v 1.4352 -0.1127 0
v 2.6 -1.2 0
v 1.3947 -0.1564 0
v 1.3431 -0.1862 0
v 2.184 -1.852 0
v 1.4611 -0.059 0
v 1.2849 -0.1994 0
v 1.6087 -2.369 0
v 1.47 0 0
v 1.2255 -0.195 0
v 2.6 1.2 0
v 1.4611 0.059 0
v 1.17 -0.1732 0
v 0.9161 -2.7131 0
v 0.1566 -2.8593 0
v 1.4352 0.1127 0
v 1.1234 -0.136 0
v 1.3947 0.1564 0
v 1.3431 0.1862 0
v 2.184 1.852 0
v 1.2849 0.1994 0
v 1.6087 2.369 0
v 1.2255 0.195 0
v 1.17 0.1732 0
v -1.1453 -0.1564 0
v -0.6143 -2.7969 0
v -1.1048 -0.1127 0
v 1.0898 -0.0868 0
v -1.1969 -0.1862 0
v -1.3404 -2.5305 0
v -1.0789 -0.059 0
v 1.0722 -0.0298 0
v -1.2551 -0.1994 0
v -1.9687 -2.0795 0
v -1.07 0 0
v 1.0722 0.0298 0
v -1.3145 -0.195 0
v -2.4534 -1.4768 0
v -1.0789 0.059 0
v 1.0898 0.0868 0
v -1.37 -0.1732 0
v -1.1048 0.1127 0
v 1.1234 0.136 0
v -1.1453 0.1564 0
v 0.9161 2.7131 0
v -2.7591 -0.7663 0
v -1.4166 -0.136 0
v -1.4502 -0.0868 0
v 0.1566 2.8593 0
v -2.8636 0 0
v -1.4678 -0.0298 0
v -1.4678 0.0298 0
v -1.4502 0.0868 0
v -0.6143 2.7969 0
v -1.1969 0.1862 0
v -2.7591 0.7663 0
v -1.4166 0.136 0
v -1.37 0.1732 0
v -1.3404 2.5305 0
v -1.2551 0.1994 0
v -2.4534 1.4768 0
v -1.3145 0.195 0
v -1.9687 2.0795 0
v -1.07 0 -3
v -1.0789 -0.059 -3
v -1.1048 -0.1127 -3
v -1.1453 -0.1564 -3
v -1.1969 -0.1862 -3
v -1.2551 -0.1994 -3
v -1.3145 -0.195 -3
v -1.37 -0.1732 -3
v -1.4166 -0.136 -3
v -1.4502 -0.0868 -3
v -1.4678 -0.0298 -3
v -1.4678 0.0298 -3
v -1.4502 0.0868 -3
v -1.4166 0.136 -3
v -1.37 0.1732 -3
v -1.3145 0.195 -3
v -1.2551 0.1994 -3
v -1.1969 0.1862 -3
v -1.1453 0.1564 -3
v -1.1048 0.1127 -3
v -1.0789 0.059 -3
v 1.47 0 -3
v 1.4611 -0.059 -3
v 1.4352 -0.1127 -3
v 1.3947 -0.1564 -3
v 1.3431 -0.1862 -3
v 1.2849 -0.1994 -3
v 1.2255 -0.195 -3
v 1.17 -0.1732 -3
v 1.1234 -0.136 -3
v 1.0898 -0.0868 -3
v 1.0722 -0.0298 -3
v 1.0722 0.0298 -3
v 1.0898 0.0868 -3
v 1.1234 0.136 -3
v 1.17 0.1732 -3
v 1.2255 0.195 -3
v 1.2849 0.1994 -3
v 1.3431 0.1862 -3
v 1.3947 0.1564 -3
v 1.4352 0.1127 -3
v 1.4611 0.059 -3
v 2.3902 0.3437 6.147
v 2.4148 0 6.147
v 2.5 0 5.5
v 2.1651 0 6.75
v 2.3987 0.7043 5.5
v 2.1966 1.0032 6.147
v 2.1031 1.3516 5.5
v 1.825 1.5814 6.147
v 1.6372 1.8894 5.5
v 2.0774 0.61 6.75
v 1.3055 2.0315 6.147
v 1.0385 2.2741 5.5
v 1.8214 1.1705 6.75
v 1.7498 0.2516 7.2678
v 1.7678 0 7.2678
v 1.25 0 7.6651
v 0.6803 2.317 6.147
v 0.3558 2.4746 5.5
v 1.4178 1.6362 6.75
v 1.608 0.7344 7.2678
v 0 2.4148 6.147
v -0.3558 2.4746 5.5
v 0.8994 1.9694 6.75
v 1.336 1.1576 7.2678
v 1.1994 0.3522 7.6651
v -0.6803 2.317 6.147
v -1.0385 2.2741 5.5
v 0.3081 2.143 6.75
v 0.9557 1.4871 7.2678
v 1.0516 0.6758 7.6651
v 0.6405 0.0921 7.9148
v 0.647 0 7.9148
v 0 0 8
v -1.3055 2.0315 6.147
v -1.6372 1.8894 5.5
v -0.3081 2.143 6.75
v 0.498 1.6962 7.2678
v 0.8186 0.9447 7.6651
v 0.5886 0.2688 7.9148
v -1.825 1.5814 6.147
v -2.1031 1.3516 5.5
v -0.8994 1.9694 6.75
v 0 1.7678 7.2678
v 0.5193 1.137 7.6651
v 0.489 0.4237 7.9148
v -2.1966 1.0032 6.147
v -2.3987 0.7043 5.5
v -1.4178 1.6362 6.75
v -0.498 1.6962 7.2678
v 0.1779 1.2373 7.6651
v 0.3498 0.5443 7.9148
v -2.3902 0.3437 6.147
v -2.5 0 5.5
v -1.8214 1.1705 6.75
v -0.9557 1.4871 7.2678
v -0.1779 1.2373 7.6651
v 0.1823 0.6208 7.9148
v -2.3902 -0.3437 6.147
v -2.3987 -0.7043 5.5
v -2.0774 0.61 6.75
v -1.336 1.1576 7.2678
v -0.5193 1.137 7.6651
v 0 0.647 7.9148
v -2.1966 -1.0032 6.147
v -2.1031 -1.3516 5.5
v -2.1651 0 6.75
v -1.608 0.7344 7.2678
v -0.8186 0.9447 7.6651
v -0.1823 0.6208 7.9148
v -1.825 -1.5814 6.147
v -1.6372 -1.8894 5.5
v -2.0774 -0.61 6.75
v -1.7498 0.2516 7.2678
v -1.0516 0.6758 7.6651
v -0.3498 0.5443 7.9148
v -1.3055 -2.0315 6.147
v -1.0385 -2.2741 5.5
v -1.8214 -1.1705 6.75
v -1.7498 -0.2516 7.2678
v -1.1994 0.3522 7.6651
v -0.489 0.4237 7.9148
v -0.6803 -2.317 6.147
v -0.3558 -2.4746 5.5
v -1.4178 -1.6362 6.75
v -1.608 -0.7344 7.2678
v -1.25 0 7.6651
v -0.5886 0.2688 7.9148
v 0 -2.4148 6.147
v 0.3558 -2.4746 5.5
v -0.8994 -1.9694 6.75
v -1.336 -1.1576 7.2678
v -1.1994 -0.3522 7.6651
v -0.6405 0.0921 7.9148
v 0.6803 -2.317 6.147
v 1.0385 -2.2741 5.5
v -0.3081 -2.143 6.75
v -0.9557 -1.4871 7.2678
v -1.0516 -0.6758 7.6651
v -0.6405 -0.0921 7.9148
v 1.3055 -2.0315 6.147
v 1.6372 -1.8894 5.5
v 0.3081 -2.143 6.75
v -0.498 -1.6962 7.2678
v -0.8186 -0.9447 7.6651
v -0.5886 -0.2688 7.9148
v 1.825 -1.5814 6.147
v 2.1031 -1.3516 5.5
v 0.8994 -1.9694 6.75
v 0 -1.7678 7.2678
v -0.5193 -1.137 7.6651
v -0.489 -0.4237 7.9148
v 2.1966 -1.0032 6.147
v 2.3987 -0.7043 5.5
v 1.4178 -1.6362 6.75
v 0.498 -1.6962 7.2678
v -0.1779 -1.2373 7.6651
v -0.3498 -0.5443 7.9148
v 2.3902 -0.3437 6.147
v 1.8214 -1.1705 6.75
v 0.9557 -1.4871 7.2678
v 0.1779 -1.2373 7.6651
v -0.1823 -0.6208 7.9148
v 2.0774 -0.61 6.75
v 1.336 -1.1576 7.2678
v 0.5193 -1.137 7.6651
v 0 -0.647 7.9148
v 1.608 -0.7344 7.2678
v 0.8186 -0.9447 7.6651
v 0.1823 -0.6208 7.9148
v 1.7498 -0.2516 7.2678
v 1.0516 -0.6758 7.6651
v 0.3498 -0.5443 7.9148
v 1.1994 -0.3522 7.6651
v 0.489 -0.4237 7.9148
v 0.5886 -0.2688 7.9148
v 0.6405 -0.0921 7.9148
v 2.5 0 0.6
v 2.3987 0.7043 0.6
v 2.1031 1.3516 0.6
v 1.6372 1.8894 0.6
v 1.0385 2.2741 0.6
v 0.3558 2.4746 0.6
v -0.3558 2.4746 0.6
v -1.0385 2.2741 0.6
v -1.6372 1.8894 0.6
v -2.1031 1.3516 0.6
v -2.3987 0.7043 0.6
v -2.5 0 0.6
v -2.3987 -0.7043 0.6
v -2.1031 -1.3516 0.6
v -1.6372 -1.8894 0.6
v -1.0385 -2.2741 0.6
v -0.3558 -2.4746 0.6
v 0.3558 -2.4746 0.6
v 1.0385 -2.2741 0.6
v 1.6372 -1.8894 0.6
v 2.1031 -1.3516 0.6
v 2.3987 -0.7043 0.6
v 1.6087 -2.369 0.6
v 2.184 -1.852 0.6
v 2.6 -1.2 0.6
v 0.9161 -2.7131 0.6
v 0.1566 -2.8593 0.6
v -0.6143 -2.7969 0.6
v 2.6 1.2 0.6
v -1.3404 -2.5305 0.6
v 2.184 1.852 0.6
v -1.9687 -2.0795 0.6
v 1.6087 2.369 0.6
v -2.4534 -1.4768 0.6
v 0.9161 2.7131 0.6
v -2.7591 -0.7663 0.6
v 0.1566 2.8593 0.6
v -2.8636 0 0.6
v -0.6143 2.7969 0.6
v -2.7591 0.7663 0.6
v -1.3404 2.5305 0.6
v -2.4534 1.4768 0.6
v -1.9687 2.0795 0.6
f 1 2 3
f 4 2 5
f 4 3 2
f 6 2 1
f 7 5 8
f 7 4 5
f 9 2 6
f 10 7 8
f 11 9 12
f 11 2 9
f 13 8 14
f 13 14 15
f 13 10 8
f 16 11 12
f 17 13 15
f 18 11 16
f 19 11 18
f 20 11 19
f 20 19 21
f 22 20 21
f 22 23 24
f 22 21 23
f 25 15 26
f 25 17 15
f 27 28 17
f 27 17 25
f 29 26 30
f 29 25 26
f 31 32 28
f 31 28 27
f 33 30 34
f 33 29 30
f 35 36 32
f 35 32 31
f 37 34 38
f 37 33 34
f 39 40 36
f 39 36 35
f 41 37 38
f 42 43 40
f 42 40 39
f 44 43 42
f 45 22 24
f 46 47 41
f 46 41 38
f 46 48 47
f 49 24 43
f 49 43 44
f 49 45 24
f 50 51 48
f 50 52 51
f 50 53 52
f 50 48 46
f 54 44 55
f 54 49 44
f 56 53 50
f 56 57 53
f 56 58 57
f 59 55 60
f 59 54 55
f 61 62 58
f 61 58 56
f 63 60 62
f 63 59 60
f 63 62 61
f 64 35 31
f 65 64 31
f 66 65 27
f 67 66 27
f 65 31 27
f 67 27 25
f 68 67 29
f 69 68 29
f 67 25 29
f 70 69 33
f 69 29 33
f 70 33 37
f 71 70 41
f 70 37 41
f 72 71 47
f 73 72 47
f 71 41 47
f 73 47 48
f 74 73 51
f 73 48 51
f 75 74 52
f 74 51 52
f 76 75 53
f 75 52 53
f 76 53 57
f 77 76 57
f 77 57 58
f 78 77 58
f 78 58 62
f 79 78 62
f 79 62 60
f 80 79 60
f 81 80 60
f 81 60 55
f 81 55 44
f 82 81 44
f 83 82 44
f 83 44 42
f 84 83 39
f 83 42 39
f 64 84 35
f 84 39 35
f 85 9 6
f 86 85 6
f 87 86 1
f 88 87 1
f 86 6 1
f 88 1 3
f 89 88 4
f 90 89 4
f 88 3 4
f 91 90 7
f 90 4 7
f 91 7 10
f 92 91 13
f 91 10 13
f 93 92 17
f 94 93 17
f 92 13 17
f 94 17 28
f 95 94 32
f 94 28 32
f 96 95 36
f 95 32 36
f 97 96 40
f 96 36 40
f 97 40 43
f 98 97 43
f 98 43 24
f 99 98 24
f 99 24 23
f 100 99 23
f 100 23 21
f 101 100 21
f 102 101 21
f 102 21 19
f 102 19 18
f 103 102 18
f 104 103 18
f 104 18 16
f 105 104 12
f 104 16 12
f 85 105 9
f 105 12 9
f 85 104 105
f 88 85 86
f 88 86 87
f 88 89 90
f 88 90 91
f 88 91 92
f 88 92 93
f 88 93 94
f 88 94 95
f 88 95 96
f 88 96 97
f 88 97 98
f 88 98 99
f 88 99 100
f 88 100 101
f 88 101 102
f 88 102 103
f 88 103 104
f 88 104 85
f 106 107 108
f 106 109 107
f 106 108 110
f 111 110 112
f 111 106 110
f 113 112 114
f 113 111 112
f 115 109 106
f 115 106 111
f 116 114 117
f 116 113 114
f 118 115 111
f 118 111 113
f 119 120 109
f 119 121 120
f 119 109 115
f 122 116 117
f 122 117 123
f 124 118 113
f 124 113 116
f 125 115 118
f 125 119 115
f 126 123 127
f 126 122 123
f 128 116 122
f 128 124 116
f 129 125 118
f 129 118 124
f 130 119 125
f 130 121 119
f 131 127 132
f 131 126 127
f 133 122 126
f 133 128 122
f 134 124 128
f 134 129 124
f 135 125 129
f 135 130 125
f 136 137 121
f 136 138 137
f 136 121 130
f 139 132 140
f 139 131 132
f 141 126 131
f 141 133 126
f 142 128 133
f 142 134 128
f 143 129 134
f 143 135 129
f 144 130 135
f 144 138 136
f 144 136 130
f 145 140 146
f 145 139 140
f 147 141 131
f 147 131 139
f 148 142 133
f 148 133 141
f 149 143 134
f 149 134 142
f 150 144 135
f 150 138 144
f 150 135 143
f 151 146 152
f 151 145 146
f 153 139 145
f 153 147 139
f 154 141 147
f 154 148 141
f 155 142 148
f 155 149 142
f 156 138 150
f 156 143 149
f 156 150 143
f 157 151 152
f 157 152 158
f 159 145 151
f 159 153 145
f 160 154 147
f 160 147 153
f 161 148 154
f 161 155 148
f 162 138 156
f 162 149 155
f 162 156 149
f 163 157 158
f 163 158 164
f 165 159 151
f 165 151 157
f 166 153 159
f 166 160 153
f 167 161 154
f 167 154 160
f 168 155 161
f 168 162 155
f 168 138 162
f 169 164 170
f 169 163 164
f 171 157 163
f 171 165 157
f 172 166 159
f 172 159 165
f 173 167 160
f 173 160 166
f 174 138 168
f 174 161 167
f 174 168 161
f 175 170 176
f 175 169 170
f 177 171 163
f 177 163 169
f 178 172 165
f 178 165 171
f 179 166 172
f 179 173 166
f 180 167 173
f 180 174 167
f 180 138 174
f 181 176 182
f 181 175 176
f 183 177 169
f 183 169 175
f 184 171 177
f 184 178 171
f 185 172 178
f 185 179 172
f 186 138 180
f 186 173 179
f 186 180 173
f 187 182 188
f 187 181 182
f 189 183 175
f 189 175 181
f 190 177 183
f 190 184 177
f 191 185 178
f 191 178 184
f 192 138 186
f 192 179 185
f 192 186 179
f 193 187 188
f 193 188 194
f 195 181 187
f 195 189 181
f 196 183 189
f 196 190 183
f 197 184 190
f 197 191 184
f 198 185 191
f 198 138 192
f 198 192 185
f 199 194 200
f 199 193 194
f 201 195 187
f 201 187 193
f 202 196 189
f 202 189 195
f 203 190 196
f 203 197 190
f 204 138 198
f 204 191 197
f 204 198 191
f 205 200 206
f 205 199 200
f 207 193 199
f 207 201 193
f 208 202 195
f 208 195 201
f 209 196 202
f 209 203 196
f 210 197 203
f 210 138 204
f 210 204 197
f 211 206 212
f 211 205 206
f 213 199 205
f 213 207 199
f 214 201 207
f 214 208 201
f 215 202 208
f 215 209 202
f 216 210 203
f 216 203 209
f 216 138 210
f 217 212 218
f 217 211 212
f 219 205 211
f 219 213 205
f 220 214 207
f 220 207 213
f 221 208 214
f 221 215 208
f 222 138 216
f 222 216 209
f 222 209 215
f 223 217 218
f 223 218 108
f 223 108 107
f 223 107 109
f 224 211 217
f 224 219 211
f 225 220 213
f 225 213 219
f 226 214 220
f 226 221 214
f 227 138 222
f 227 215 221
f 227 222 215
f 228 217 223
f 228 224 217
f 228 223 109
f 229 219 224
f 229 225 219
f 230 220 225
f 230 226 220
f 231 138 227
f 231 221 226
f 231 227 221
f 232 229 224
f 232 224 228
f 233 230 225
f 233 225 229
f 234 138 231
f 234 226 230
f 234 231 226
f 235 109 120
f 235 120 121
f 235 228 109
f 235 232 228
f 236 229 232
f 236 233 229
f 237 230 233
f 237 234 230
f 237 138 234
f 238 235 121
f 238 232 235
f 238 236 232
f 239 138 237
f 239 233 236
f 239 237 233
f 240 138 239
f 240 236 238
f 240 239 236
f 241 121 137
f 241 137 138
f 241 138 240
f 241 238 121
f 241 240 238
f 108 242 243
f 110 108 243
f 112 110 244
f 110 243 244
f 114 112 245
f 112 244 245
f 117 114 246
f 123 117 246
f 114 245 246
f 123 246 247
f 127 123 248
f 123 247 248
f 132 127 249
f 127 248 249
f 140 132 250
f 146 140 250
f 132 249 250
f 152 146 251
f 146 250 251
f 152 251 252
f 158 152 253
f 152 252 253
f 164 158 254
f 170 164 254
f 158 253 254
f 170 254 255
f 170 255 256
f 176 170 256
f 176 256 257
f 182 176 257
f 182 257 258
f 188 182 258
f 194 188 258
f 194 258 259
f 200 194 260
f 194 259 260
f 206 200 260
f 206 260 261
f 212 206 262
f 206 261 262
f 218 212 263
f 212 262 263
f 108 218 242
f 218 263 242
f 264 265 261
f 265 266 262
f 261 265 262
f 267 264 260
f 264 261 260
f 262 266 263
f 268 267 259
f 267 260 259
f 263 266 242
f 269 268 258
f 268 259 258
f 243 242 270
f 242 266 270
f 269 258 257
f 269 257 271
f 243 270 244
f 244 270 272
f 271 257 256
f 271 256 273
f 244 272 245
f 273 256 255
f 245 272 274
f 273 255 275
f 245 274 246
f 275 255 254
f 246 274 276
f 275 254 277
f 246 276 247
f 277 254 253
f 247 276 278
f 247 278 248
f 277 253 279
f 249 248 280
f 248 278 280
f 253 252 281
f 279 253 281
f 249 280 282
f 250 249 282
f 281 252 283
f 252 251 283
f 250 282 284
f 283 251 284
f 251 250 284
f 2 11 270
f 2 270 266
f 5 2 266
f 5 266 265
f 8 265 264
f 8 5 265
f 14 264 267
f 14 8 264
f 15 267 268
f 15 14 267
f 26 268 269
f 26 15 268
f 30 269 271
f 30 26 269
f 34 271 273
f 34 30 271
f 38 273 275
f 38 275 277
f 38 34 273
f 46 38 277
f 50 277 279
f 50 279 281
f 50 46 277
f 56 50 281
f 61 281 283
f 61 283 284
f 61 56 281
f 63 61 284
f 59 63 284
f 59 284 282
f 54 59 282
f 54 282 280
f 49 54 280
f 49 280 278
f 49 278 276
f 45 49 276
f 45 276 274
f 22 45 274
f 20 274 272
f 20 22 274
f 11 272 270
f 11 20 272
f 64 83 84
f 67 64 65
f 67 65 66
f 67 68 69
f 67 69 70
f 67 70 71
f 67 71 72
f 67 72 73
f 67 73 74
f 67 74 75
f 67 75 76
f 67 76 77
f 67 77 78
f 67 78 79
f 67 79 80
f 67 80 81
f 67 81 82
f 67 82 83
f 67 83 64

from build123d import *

# Parameters (mm, degrees)
EXTRUDE_1_DEPTH = 0.6
SKETCH_2_R      = 2.5
EXTRUDE_2_DEPTH = 7.4
FILLET_1_R      = 2.5
SKETCH_3_R      = 0.2
EXTRUDE_3_DEPTH = 3


with BuildPart() as part:
    # 草图1 → 凸台-拉伸1 (new body)
    with BuildSketch(Plane.XY):
        with BuildLine():
            Line((2.6, 1.2), (2.6, -1.2))
            ThreePointArc((2.6, -1.2), (-2.863564213, 0), (2.6, 1.2))
        make_face()
    extrude(amount=EXTRUDE_1_DEPTH)

    # 草图2 → 凸台-拉伸2 (add)
    with BuildSketch(Plane.XY.offset(0.6)):
        Circle(SKETCH_2_R)
    extrude(amount=EXTRUDE_2_DEPTH)

    # 圆角1
    fillet_1_edges = [part.edges().sort_by_distance(p)[0] for p in [
        (-2.5, 0, 8),
    ]]
    fillet(fillet_1_edges, radius=FILLET_1_R)

    # 草图3 → 凸台-拉伸3 (add)
    with BuildSketch(Plane(origin=(0, 0, 0), x_dir=(-1, 0, 0), z_dir=(0, 0, -1))):
        with Locations(Location((1.27, 0, 0), (0, 0, 180))):
            Circle(SKETCH_3_R)
        with Locations(Location((-1.27, 0, 0), (0, 0, 180))):
            Circle(SKETCH_3_R)
    extrude(amount=EXTRUDE_3_DEPTH)


solid = part.part
